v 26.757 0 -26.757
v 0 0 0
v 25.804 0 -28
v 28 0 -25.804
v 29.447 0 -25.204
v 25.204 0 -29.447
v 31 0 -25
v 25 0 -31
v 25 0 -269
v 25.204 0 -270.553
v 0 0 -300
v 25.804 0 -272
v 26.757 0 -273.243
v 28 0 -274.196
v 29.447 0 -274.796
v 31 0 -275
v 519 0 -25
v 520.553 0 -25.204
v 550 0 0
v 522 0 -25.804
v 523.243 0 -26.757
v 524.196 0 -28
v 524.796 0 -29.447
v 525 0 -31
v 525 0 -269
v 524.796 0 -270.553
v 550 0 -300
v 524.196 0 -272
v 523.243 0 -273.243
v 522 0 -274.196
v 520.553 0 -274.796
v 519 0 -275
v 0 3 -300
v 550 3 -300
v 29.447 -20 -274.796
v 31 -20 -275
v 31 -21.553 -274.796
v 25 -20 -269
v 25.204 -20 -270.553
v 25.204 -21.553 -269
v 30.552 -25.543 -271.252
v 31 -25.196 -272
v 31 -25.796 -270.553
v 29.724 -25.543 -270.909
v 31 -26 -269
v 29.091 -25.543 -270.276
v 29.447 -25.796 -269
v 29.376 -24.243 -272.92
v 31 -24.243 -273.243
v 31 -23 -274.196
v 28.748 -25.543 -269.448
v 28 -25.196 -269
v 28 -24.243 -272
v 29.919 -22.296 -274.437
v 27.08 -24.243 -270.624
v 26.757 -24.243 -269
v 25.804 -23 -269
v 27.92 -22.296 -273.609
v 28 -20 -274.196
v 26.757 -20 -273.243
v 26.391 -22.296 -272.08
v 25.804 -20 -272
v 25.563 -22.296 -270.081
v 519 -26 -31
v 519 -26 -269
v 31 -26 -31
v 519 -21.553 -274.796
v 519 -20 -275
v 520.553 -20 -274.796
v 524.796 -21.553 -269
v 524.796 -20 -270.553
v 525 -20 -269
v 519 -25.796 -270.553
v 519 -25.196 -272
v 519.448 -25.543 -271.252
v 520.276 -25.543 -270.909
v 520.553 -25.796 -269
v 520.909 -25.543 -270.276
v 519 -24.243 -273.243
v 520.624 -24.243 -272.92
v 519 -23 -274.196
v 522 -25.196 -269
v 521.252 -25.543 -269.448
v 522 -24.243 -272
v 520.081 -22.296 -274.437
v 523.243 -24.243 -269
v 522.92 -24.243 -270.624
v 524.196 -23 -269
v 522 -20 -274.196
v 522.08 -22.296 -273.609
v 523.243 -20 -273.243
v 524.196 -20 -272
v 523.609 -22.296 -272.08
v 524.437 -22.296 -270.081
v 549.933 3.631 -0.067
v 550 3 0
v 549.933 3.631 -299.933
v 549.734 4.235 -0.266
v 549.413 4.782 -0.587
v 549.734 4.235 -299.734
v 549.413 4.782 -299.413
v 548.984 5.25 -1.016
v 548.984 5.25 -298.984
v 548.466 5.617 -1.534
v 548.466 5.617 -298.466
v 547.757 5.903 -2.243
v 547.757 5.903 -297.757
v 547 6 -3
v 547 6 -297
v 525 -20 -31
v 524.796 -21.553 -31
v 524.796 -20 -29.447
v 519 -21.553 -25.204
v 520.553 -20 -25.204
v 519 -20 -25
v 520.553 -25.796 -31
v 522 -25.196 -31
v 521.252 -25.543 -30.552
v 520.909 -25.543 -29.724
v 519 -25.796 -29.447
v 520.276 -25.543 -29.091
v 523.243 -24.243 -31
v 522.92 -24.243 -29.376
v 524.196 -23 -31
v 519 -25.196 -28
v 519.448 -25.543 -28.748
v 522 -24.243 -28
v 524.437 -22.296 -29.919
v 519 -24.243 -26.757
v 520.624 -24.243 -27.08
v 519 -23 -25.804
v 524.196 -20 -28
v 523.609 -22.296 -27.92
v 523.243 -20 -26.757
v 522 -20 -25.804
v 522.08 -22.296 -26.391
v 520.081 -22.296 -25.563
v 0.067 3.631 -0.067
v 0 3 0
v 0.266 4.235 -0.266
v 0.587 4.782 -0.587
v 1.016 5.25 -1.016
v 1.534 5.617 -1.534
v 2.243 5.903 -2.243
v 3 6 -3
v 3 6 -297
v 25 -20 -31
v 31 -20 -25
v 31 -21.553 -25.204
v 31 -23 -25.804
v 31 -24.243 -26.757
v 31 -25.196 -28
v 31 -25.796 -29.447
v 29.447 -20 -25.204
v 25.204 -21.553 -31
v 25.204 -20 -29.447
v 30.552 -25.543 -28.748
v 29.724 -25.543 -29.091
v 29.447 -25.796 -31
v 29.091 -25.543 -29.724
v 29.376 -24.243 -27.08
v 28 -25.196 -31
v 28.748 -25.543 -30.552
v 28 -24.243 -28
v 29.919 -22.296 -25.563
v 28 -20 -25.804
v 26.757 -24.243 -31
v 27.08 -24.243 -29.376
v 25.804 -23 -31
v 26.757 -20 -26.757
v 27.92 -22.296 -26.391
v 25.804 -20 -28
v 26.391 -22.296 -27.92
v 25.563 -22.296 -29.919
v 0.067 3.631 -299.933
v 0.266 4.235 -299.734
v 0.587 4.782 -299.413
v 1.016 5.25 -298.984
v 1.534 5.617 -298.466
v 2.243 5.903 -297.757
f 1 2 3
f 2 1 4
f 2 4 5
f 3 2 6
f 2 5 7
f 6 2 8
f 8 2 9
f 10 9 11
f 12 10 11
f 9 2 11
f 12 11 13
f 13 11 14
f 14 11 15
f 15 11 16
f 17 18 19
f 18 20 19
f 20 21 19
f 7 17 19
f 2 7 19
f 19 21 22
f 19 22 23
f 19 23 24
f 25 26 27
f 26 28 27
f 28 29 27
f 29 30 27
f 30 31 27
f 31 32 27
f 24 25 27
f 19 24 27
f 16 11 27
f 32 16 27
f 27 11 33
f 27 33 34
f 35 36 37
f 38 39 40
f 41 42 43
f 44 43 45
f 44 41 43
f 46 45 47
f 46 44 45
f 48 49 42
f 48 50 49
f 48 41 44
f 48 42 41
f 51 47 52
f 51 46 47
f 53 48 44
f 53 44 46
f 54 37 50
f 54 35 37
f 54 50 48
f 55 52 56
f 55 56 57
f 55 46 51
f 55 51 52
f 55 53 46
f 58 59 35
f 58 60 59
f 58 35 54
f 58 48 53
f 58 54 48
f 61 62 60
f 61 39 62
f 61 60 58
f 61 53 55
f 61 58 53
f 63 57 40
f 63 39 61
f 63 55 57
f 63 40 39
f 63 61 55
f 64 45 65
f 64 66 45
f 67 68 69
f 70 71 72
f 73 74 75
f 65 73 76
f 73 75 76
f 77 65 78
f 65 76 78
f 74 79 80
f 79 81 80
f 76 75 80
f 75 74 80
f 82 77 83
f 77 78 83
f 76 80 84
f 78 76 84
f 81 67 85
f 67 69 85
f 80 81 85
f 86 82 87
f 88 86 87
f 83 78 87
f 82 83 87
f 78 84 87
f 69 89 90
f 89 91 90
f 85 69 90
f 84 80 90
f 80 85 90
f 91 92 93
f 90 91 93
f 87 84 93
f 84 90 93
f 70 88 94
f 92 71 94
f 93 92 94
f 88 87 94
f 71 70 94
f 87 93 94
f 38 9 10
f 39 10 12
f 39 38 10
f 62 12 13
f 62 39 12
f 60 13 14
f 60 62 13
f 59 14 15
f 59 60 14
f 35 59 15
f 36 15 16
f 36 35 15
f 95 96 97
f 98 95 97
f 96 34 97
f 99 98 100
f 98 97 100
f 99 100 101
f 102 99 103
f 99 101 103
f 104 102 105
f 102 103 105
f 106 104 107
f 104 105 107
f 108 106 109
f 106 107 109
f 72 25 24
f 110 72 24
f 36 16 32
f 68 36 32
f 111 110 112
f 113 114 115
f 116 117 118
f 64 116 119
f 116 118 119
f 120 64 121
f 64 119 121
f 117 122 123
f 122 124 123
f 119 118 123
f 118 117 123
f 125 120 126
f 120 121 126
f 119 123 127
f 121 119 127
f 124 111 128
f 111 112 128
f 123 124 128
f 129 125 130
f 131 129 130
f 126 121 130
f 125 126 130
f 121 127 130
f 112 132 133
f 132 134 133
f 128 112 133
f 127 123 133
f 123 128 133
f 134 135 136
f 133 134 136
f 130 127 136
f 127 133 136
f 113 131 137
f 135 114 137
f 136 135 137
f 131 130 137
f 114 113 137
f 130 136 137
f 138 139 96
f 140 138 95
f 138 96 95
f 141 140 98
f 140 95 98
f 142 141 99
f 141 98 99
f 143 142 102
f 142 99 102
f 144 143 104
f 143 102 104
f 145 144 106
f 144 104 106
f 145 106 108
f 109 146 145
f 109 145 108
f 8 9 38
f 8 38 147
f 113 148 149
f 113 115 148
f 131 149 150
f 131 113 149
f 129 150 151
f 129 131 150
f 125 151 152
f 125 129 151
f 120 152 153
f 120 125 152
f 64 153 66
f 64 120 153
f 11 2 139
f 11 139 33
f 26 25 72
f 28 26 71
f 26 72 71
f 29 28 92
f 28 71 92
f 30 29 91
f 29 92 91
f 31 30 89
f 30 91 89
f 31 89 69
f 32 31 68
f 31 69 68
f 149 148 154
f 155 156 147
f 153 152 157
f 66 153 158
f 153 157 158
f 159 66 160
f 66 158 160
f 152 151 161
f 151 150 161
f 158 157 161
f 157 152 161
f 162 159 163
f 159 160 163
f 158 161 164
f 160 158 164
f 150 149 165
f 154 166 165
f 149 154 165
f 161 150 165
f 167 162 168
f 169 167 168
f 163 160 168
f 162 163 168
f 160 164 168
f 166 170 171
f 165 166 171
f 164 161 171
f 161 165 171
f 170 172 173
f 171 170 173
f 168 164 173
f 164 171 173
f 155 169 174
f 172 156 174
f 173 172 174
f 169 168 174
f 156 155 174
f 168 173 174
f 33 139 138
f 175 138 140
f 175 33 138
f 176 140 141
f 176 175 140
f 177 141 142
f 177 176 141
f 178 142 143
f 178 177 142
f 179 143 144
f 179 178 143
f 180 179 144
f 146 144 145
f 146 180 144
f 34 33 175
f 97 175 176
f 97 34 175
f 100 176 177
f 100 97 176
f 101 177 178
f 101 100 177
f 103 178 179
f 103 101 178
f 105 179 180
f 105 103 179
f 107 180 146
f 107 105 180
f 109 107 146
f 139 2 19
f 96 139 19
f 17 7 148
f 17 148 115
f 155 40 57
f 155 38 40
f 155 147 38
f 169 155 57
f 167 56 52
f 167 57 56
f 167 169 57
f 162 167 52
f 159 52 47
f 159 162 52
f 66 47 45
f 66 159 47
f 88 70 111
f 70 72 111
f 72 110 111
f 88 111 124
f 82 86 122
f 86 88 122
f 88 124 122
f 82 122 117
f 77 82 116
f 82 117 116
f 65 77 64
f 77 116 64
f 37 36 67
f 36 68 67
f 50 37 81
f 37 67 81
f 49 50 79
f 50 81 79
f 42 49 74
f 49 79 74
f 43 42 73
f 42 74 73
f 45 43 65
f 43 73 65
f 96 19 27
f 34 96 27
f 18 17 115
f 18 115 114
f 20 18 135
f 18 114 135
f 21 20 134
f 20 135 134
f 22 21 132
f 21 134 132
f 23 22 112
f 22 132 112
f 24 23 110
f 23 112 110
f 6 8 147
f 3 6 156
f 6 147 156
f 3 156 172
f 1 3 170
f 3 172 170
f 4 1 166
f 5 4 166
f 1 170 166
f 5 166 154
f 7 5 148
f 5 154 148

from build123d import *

# Parameters (mm, degrees)
SKETCH1_W           = 550
SKETCH1_H           = 300
BOSS_EXTRUDE1_DEPTH = 6
FILLET1_R           = 3
SKETCH3_W           = 500
SKETCH3_H           = 250
BOSS_EXTRUDE2_DEPTH = 26
FILLET2_R           = 6


with BuildPart() as part:
    # Sketch1 → Boss-Extrude1 (new body)
    with BuildSketch(Plane(origin=(0, 0, 0), x_dir=(1, 0, 0), z_dir=(0, 1, 0))):
        with Locations((275, 150)):
            Rectangle(SKETCH1_W, SKETCH1_H)
    extrude(amount=BOSS_EXTRUDE1_DEPTH)

    # Fillet1
    fillet1_edges = [part.edges().sort_by_distance(p)[0] for p in [
        (550, 6, -150),
        (275, 6, -300),
        (0, 6, -150),
        (275, 6, 0),
    ]]
    fillet(fillet1_edges, radius=FILLET1_R)

    # Sketch3 → Boss-Extrude2 (add)
    with BuildSketch(Plane.XZ):
        with Locations((275, -150)):
            Rectangle(SKETCH3_W, SKETCH3_H)
    extrude(amount=BOSS_EXTRUDE2_DEPTH)

    # Fillet2
    fillet2_edges = [part.edges().sort_by_distance(p)[0] for p in [
        (25, -13, -275),
        (525, -13, -275),
        (525, -13, -25),
        (25, -13, -25),
        (275, -26, -275),
        (525, -26, -150),
        (275, -26, -25),
        (25, -26, -150),
    ]]
    fillet(fillet2_edges, radius=FILLET2_R)


solid = part.part
